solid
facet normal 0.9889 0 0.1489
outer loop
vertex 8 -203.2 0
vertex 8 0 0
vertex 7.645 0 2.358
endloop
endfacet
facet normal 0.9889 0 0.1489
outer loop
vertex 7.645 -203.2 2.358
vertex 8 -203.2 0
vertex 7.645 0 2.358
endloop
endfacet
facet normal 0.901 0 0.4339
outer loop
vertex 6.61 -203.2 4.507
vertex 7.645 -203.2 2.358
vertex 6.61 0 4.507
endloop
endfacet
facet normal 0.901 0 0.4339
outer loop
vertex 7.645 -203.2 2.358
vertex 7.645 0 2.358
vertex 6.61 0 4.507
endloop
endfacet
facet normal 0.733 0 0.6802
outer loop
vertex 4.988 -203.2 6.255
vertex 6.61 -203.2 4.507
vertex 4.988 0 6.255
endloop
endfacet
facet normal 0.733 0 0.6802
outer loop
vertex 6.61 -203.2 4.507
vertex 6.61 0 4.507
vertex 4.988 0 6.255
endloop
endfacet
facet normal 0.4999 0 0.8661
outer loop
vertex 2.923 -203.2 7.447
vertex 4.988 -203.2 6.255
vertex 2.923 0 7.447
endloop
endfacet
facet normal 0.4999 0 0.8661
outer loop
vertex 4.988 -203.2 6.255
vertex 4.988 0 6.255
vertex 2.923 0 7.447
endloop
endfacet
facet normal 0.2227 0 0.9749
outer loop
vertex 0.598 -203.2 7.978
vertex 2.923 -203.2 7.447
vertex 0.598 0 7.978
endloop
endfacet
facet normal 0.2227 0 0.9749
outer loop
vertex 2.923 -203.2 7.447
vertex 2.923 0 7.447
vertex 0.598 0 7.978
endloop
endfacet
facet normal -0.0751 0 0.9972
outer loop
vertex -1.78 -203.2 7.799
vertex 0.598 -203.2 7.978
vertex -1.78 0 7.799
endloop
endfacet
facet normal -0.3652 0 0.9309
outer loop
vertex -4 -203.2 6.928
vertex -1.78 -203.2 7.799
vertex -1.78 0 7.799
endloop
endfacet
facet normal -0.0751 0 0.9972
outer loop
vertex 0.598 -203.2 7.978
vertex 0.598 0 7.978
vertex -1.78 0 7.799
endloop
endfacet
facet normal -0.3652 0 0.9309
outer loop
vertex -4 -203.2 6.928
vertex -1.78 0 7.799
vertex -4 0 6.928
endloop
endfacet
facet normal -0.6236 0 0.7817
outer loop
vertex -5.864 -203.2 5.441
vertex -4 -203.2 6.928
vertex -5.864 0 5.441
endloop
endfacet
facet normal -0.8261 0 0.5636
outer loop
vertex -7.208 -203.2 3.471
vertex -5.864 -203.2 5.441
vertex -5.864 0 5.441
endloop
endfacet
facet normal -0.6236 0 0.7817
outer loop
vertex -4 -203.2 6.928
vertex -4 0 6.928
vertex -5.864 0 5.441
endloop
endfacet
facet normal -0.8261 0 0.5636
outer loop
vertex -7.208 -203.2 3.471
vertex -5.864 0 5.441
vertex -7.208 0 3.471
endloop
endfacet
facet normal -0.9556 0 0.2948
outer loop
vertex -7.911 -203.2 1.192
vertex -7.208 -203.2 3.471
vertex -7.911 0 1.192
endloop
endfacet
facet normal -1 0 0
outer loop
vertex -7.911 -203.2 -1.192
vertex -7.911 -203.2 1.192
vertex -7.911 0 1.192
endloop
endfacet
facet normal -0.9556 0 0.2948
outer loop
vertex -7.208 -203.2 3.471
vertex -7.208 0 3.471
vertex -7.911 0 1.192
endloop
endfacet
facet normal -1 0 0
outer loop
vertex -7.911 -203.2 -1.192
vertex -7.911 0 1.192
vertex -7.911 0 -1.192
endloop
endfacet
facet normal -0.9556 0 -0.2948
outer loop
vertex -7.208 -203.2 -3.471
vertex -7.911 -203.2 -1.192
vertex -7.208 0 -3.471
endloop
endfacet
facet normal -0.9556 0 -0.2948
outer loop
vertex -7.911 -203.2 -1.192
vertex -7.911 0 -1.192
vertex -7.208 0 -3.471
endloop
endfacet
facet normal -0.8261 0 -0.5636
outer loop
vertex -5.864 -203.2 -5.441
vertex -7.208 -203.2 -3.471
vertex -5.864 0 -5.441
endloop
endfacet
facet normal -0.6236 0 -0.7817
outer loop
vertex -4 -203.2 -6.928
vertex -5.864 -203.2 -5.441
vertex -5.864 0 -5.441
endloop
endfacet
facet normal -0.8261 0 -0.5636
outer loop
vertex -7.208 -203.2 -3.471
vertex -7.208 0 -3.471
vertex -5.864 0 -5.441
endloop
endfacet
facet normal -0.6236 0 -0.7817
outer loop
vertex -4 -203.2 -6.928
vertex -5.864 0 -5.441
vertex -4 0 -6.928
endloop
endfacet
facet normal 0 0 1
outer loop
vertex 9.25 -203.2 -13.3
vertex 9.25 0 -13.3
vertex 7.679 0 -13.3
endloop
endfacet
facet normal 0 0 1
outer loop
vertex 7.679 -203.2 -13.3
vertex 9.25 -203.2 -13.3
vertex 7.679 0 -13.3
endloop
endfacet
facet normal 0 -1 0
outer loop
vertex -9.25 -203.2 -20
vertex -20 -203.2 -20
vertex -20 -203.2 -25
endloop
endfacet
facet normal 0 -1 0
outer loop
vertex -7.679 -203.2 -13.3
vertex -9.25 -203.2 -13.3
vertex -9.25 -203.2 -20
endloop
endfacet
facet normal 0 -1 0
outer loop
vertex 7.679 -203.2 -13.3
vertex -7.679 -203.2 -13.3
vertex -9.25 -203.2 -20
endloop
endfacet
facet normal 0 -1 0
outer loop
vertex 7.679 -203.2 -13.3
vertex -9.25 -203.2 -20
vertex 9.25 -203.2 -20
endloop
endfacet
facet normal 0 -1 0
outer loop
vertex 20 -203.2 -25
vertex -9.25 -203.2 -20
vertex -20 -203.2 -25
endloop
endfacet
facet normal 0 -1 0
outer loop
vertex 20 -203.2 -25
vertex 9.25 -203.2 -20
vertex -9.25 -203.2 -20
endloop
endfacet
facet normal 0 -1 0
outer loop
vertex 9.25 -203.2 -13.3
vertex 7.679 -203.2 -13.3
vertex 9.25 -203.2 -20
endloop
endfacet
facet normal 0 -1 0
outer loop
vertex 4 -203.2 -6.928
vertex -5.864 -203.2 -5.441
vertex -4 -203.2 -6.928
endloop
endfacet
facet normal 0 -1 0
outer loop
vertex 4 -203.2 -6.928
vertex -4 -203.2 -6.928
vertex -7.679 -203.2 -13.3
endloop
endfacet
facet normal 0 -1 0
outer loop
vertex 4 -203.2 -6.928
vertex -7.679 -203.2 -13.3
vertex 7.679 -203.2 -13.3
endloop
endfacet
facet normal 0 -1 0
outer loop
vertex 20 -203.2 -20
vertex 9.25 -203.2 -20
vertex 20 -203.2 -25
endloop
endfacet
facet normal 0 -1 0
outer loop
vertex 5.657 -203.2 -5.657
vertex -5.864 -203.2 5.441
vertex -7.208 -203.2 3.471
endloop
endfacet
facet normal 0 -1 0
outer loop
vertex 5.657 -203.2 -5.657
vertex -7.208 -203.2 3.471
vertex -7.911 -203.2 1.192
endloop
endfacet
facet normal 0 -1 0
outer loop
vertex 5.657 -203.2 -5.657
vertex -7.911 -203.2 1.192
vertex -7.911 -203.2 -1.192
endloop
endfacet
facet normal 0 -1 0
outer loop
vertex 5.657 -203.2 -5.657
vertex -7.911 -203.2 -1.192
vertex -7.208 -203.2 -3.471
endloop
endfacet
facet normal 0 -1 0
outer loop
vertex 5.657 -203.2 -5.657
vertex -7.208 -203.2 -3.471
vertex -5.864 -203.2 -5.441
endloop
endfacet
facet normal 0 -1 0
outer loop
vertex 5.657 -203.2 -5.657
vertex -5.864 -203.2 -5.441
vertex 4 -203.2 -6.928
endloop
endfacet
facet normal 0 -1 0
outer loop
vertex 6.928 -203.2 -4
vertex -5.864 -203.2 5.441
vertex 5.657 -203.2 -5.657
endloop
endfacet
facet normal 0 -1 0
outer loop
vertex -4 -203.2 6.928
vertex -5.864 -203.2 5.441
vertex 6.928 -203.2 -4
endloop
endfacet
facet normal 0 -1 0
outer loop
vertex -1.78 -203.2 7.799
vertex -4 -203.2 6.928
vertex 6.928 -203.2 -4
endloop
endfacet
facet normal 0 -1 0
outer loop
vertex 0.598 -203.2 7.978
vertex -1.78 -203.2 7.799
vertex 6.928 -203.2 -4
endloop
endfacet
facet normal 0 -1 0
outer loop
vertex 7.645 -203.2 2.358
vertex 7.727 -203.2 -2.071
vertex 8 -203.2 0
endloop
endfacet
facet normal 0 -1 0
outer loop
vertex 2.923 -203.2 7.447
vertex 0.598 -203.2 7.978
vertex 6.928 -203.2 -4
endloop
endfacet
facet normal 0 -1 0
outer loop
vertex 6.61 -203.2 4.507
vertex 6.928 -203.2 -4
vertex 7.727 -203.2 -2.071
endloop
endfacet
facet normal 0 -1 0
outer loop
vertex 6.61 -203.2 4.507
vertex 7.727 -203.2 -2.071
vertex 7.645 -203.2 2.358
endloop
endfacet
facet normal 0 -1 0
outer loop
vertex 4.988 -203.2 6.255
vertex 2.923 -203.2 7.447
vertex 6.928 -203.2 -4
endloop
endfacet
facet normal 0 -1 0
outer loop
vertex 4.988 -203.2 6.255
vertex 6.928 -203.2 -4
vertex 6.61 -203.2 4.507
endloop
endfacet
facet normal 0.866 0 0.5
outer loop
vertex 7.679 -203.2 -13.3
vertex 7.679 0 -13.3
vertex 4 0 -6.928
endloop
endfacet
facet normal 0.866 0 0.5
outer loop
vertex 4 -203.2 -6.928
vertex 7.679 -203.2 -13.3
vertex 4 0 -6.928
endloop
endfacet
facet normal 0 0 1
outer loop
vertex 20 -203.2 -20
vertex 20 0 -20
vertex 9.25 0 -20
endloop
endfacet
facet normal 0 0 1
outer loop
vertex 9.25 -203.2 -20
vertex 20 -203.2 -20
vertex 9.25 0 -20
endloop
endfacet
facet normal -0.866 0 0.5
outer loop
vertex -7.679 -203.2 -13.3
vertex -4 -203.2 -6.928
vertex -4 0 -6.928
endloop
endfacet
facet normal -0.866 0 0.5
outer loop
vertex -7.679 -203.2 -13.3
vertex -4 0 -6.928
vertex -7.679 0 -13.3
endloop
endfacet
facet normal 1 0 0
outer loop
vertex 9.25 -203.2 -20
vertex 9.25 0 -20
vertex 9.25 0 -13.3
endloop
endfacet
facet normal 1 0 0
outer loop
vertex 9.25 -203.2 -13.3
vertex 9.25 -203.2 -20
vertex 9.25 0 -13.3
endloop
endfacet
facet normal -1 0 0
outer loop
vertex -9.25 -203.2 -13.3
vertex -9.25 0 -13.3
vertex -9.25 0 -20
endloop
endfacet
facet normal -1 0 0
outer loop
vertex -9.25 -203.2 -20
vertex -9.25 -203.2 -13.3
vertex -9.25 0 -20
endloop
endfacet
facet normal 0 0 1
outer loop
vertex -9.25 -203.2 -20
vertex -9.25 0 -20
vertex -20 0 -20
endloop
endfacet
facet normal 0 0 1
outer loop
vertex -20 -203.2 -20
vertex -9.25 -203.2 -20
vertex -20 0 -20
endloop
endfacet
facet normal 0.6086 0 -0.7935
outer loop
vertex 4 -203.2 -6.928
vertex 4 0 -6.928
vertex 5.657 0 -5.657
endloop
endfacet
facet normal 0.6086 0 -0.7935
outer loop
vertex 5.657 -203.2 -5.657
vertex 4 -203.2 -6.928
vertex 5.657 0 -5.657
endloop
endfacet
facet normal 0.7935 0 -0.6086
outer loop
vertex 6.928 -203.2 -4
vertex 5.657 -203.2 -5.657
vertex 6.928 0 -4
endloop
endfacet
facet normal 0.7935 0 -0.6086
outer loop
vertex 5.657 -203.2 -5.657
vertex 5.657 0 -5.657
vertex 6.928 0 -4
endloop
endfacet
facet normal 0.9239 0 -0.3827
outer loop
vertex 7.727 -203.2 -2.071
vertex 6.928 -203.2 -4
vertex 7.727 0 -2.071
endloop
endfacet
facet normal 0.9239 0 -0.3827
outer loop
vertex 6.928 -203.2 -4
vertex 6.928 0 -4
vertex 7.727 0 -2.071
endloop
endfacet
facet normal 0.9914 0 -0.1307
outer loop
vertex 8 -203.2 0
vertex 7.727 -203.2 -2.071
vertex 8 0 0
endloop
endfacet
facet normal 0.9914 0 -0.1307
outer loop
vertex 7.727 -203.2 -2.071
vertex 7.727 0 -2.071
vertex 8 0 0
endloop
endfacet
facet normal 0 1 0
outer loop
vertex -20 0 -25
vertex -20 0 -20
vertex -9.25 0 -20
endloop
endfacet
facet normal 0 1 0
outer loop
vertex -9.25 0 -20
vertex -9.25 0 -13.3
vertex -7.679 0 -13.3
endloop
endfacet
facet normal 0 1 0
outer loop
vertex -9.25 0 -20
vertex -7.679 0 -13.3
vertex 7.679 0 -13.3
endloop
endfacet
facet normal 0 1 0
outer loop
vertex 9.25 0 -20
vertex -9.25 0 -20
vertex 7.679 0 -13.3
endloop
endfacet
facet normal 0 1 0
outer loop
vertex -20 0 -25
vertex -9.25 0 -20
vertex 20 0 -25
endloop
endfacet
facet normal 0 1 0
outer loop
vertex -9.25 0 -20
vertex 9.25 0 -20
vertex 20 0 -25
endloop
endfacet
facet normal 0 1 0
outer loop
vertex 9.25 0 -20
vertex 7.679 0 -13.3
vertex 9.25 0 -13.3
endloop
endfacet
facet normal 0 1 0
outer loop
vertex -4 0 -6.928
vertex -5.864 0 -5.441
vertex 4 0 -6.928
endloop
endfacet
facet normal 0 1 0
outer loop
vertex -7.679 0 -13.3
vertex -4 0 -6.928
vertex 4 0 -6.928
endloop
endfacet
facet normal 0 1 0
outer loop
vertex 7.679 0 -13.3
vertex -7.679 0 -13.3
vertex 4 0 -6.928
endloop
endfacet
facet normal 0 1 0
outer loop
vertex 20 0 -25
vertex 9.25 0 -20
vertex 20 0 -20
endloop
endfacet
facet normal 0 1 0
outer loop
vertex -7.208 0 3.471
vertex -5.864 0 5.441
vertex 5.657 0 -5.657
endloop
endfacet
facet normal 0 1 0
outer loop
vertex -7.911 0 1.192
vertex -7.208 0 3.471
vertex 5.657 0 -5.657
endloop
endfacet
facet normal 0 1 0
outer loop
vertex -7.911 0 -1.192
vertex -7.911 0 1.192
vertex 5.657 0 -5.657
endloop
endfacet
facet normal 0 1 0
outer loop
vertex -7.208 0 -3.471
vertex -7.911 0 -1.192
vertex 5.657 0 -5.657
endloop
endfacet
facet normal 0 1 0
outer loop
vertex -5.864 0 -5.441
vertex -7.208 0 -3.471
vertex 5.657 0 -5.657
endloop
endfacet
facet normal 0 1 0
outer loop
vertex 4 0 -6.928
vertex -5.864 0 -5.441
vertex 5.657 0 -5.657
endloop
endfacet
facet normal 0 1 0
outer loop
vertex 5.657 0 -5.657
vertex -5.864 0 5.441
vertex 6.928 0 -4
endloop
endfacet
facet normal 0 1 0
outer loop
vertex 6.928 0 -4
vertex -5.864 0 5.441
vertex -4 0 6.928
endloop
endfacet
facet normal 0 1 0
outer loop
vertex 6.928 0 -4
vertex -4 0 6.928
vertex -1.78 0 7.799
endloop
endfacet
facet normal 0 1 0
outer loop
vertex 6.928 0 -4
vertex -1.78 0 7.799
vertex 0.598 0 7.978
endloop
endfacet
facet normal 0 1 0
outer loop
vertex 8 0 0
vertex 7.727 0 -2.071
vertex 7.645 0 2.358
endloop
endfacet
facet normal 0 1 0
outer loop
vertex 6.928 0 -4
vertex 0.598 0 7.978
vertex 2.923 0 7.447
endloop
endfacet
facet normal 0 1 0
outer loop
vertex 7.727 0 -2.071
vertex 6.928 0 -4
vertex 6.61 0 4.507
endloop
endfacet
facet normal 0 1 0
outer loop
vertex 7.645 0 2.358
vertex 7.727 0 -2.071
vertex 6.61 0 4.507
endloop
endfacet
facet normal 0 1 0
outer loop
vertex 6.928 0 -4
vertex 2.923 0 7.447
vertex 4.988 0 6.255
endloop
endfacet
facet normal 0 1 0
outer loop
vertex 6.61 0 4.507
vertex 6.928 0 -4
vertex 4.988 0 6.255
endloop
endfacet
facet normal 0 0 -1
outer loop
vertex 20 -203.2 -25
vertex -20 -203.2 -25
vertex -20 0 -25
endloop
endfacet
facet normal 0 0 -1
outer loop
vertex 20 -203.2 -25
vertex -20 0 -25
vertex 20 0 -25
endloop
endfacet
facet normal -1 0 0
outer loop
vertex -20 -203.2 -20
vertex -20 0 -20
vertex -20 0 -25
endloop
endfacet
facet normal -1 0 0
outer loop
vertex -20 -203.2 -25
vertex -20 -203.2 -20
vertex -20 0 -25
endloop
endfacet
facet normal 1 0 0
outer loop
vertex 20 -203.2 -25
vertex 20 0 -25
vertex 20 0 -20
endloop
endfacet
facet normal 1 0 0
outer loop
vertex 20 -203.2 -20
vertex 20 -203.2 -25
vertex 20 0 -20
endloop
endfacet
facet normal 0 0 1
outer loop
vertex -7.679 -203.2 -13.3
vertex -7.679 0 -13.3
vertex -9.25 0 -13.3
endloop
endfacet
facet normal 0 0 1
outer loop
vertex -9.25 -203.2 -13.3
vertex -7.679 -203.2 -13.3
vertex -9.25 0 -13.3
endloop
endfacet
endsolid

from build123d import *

# Parameters (mm, degrees)
F1_DEPTH = 203.2


with BuildPart() as f1:
    # F0 (on Front) → F1 (new body)
    with BuildSketch(Plane.XZ):
        with BuildLine():
            ThreePointArc((4, -6.928203), (6.928203, -4), (8, 0))
            ThreePointArc((8, 0), (-4, 6.928203), (-4, -6.928203))
            ThreePointArc((-4, -6.928203), (0, -8), (4, -6.928203))
        make_face()
        with BuildLine():
            ThreePointArc((4, -6.928203), (0, -8), (-4, -6.928203))
            Line((-4, -6.928203), (-7.678759, -13.3))
            Line((-7.678759, -13.3), (-9.25, -13.3))
            Line((-9.25, -13.3), (-9.25, -20))
            Line((-9.25, -20), (-20, -20))
            Line((-20, -20), (-20, -25))
            Line((-20, -25), (0, -25))
            Line((0, -25), (20, -25))
            Line((20, -25), (20, -20))
            Line((20, -20), (9.25, -20))
            Line((9.25, -20), (9.25, -13.3))
            Line((9.25, -13.3), (7.678759, -13.3))
            Line((7.678759, -13.3), (4, -6.928203))
        make_face()
    extrude(amount=F1_DEPTH)


solid = f1.part
